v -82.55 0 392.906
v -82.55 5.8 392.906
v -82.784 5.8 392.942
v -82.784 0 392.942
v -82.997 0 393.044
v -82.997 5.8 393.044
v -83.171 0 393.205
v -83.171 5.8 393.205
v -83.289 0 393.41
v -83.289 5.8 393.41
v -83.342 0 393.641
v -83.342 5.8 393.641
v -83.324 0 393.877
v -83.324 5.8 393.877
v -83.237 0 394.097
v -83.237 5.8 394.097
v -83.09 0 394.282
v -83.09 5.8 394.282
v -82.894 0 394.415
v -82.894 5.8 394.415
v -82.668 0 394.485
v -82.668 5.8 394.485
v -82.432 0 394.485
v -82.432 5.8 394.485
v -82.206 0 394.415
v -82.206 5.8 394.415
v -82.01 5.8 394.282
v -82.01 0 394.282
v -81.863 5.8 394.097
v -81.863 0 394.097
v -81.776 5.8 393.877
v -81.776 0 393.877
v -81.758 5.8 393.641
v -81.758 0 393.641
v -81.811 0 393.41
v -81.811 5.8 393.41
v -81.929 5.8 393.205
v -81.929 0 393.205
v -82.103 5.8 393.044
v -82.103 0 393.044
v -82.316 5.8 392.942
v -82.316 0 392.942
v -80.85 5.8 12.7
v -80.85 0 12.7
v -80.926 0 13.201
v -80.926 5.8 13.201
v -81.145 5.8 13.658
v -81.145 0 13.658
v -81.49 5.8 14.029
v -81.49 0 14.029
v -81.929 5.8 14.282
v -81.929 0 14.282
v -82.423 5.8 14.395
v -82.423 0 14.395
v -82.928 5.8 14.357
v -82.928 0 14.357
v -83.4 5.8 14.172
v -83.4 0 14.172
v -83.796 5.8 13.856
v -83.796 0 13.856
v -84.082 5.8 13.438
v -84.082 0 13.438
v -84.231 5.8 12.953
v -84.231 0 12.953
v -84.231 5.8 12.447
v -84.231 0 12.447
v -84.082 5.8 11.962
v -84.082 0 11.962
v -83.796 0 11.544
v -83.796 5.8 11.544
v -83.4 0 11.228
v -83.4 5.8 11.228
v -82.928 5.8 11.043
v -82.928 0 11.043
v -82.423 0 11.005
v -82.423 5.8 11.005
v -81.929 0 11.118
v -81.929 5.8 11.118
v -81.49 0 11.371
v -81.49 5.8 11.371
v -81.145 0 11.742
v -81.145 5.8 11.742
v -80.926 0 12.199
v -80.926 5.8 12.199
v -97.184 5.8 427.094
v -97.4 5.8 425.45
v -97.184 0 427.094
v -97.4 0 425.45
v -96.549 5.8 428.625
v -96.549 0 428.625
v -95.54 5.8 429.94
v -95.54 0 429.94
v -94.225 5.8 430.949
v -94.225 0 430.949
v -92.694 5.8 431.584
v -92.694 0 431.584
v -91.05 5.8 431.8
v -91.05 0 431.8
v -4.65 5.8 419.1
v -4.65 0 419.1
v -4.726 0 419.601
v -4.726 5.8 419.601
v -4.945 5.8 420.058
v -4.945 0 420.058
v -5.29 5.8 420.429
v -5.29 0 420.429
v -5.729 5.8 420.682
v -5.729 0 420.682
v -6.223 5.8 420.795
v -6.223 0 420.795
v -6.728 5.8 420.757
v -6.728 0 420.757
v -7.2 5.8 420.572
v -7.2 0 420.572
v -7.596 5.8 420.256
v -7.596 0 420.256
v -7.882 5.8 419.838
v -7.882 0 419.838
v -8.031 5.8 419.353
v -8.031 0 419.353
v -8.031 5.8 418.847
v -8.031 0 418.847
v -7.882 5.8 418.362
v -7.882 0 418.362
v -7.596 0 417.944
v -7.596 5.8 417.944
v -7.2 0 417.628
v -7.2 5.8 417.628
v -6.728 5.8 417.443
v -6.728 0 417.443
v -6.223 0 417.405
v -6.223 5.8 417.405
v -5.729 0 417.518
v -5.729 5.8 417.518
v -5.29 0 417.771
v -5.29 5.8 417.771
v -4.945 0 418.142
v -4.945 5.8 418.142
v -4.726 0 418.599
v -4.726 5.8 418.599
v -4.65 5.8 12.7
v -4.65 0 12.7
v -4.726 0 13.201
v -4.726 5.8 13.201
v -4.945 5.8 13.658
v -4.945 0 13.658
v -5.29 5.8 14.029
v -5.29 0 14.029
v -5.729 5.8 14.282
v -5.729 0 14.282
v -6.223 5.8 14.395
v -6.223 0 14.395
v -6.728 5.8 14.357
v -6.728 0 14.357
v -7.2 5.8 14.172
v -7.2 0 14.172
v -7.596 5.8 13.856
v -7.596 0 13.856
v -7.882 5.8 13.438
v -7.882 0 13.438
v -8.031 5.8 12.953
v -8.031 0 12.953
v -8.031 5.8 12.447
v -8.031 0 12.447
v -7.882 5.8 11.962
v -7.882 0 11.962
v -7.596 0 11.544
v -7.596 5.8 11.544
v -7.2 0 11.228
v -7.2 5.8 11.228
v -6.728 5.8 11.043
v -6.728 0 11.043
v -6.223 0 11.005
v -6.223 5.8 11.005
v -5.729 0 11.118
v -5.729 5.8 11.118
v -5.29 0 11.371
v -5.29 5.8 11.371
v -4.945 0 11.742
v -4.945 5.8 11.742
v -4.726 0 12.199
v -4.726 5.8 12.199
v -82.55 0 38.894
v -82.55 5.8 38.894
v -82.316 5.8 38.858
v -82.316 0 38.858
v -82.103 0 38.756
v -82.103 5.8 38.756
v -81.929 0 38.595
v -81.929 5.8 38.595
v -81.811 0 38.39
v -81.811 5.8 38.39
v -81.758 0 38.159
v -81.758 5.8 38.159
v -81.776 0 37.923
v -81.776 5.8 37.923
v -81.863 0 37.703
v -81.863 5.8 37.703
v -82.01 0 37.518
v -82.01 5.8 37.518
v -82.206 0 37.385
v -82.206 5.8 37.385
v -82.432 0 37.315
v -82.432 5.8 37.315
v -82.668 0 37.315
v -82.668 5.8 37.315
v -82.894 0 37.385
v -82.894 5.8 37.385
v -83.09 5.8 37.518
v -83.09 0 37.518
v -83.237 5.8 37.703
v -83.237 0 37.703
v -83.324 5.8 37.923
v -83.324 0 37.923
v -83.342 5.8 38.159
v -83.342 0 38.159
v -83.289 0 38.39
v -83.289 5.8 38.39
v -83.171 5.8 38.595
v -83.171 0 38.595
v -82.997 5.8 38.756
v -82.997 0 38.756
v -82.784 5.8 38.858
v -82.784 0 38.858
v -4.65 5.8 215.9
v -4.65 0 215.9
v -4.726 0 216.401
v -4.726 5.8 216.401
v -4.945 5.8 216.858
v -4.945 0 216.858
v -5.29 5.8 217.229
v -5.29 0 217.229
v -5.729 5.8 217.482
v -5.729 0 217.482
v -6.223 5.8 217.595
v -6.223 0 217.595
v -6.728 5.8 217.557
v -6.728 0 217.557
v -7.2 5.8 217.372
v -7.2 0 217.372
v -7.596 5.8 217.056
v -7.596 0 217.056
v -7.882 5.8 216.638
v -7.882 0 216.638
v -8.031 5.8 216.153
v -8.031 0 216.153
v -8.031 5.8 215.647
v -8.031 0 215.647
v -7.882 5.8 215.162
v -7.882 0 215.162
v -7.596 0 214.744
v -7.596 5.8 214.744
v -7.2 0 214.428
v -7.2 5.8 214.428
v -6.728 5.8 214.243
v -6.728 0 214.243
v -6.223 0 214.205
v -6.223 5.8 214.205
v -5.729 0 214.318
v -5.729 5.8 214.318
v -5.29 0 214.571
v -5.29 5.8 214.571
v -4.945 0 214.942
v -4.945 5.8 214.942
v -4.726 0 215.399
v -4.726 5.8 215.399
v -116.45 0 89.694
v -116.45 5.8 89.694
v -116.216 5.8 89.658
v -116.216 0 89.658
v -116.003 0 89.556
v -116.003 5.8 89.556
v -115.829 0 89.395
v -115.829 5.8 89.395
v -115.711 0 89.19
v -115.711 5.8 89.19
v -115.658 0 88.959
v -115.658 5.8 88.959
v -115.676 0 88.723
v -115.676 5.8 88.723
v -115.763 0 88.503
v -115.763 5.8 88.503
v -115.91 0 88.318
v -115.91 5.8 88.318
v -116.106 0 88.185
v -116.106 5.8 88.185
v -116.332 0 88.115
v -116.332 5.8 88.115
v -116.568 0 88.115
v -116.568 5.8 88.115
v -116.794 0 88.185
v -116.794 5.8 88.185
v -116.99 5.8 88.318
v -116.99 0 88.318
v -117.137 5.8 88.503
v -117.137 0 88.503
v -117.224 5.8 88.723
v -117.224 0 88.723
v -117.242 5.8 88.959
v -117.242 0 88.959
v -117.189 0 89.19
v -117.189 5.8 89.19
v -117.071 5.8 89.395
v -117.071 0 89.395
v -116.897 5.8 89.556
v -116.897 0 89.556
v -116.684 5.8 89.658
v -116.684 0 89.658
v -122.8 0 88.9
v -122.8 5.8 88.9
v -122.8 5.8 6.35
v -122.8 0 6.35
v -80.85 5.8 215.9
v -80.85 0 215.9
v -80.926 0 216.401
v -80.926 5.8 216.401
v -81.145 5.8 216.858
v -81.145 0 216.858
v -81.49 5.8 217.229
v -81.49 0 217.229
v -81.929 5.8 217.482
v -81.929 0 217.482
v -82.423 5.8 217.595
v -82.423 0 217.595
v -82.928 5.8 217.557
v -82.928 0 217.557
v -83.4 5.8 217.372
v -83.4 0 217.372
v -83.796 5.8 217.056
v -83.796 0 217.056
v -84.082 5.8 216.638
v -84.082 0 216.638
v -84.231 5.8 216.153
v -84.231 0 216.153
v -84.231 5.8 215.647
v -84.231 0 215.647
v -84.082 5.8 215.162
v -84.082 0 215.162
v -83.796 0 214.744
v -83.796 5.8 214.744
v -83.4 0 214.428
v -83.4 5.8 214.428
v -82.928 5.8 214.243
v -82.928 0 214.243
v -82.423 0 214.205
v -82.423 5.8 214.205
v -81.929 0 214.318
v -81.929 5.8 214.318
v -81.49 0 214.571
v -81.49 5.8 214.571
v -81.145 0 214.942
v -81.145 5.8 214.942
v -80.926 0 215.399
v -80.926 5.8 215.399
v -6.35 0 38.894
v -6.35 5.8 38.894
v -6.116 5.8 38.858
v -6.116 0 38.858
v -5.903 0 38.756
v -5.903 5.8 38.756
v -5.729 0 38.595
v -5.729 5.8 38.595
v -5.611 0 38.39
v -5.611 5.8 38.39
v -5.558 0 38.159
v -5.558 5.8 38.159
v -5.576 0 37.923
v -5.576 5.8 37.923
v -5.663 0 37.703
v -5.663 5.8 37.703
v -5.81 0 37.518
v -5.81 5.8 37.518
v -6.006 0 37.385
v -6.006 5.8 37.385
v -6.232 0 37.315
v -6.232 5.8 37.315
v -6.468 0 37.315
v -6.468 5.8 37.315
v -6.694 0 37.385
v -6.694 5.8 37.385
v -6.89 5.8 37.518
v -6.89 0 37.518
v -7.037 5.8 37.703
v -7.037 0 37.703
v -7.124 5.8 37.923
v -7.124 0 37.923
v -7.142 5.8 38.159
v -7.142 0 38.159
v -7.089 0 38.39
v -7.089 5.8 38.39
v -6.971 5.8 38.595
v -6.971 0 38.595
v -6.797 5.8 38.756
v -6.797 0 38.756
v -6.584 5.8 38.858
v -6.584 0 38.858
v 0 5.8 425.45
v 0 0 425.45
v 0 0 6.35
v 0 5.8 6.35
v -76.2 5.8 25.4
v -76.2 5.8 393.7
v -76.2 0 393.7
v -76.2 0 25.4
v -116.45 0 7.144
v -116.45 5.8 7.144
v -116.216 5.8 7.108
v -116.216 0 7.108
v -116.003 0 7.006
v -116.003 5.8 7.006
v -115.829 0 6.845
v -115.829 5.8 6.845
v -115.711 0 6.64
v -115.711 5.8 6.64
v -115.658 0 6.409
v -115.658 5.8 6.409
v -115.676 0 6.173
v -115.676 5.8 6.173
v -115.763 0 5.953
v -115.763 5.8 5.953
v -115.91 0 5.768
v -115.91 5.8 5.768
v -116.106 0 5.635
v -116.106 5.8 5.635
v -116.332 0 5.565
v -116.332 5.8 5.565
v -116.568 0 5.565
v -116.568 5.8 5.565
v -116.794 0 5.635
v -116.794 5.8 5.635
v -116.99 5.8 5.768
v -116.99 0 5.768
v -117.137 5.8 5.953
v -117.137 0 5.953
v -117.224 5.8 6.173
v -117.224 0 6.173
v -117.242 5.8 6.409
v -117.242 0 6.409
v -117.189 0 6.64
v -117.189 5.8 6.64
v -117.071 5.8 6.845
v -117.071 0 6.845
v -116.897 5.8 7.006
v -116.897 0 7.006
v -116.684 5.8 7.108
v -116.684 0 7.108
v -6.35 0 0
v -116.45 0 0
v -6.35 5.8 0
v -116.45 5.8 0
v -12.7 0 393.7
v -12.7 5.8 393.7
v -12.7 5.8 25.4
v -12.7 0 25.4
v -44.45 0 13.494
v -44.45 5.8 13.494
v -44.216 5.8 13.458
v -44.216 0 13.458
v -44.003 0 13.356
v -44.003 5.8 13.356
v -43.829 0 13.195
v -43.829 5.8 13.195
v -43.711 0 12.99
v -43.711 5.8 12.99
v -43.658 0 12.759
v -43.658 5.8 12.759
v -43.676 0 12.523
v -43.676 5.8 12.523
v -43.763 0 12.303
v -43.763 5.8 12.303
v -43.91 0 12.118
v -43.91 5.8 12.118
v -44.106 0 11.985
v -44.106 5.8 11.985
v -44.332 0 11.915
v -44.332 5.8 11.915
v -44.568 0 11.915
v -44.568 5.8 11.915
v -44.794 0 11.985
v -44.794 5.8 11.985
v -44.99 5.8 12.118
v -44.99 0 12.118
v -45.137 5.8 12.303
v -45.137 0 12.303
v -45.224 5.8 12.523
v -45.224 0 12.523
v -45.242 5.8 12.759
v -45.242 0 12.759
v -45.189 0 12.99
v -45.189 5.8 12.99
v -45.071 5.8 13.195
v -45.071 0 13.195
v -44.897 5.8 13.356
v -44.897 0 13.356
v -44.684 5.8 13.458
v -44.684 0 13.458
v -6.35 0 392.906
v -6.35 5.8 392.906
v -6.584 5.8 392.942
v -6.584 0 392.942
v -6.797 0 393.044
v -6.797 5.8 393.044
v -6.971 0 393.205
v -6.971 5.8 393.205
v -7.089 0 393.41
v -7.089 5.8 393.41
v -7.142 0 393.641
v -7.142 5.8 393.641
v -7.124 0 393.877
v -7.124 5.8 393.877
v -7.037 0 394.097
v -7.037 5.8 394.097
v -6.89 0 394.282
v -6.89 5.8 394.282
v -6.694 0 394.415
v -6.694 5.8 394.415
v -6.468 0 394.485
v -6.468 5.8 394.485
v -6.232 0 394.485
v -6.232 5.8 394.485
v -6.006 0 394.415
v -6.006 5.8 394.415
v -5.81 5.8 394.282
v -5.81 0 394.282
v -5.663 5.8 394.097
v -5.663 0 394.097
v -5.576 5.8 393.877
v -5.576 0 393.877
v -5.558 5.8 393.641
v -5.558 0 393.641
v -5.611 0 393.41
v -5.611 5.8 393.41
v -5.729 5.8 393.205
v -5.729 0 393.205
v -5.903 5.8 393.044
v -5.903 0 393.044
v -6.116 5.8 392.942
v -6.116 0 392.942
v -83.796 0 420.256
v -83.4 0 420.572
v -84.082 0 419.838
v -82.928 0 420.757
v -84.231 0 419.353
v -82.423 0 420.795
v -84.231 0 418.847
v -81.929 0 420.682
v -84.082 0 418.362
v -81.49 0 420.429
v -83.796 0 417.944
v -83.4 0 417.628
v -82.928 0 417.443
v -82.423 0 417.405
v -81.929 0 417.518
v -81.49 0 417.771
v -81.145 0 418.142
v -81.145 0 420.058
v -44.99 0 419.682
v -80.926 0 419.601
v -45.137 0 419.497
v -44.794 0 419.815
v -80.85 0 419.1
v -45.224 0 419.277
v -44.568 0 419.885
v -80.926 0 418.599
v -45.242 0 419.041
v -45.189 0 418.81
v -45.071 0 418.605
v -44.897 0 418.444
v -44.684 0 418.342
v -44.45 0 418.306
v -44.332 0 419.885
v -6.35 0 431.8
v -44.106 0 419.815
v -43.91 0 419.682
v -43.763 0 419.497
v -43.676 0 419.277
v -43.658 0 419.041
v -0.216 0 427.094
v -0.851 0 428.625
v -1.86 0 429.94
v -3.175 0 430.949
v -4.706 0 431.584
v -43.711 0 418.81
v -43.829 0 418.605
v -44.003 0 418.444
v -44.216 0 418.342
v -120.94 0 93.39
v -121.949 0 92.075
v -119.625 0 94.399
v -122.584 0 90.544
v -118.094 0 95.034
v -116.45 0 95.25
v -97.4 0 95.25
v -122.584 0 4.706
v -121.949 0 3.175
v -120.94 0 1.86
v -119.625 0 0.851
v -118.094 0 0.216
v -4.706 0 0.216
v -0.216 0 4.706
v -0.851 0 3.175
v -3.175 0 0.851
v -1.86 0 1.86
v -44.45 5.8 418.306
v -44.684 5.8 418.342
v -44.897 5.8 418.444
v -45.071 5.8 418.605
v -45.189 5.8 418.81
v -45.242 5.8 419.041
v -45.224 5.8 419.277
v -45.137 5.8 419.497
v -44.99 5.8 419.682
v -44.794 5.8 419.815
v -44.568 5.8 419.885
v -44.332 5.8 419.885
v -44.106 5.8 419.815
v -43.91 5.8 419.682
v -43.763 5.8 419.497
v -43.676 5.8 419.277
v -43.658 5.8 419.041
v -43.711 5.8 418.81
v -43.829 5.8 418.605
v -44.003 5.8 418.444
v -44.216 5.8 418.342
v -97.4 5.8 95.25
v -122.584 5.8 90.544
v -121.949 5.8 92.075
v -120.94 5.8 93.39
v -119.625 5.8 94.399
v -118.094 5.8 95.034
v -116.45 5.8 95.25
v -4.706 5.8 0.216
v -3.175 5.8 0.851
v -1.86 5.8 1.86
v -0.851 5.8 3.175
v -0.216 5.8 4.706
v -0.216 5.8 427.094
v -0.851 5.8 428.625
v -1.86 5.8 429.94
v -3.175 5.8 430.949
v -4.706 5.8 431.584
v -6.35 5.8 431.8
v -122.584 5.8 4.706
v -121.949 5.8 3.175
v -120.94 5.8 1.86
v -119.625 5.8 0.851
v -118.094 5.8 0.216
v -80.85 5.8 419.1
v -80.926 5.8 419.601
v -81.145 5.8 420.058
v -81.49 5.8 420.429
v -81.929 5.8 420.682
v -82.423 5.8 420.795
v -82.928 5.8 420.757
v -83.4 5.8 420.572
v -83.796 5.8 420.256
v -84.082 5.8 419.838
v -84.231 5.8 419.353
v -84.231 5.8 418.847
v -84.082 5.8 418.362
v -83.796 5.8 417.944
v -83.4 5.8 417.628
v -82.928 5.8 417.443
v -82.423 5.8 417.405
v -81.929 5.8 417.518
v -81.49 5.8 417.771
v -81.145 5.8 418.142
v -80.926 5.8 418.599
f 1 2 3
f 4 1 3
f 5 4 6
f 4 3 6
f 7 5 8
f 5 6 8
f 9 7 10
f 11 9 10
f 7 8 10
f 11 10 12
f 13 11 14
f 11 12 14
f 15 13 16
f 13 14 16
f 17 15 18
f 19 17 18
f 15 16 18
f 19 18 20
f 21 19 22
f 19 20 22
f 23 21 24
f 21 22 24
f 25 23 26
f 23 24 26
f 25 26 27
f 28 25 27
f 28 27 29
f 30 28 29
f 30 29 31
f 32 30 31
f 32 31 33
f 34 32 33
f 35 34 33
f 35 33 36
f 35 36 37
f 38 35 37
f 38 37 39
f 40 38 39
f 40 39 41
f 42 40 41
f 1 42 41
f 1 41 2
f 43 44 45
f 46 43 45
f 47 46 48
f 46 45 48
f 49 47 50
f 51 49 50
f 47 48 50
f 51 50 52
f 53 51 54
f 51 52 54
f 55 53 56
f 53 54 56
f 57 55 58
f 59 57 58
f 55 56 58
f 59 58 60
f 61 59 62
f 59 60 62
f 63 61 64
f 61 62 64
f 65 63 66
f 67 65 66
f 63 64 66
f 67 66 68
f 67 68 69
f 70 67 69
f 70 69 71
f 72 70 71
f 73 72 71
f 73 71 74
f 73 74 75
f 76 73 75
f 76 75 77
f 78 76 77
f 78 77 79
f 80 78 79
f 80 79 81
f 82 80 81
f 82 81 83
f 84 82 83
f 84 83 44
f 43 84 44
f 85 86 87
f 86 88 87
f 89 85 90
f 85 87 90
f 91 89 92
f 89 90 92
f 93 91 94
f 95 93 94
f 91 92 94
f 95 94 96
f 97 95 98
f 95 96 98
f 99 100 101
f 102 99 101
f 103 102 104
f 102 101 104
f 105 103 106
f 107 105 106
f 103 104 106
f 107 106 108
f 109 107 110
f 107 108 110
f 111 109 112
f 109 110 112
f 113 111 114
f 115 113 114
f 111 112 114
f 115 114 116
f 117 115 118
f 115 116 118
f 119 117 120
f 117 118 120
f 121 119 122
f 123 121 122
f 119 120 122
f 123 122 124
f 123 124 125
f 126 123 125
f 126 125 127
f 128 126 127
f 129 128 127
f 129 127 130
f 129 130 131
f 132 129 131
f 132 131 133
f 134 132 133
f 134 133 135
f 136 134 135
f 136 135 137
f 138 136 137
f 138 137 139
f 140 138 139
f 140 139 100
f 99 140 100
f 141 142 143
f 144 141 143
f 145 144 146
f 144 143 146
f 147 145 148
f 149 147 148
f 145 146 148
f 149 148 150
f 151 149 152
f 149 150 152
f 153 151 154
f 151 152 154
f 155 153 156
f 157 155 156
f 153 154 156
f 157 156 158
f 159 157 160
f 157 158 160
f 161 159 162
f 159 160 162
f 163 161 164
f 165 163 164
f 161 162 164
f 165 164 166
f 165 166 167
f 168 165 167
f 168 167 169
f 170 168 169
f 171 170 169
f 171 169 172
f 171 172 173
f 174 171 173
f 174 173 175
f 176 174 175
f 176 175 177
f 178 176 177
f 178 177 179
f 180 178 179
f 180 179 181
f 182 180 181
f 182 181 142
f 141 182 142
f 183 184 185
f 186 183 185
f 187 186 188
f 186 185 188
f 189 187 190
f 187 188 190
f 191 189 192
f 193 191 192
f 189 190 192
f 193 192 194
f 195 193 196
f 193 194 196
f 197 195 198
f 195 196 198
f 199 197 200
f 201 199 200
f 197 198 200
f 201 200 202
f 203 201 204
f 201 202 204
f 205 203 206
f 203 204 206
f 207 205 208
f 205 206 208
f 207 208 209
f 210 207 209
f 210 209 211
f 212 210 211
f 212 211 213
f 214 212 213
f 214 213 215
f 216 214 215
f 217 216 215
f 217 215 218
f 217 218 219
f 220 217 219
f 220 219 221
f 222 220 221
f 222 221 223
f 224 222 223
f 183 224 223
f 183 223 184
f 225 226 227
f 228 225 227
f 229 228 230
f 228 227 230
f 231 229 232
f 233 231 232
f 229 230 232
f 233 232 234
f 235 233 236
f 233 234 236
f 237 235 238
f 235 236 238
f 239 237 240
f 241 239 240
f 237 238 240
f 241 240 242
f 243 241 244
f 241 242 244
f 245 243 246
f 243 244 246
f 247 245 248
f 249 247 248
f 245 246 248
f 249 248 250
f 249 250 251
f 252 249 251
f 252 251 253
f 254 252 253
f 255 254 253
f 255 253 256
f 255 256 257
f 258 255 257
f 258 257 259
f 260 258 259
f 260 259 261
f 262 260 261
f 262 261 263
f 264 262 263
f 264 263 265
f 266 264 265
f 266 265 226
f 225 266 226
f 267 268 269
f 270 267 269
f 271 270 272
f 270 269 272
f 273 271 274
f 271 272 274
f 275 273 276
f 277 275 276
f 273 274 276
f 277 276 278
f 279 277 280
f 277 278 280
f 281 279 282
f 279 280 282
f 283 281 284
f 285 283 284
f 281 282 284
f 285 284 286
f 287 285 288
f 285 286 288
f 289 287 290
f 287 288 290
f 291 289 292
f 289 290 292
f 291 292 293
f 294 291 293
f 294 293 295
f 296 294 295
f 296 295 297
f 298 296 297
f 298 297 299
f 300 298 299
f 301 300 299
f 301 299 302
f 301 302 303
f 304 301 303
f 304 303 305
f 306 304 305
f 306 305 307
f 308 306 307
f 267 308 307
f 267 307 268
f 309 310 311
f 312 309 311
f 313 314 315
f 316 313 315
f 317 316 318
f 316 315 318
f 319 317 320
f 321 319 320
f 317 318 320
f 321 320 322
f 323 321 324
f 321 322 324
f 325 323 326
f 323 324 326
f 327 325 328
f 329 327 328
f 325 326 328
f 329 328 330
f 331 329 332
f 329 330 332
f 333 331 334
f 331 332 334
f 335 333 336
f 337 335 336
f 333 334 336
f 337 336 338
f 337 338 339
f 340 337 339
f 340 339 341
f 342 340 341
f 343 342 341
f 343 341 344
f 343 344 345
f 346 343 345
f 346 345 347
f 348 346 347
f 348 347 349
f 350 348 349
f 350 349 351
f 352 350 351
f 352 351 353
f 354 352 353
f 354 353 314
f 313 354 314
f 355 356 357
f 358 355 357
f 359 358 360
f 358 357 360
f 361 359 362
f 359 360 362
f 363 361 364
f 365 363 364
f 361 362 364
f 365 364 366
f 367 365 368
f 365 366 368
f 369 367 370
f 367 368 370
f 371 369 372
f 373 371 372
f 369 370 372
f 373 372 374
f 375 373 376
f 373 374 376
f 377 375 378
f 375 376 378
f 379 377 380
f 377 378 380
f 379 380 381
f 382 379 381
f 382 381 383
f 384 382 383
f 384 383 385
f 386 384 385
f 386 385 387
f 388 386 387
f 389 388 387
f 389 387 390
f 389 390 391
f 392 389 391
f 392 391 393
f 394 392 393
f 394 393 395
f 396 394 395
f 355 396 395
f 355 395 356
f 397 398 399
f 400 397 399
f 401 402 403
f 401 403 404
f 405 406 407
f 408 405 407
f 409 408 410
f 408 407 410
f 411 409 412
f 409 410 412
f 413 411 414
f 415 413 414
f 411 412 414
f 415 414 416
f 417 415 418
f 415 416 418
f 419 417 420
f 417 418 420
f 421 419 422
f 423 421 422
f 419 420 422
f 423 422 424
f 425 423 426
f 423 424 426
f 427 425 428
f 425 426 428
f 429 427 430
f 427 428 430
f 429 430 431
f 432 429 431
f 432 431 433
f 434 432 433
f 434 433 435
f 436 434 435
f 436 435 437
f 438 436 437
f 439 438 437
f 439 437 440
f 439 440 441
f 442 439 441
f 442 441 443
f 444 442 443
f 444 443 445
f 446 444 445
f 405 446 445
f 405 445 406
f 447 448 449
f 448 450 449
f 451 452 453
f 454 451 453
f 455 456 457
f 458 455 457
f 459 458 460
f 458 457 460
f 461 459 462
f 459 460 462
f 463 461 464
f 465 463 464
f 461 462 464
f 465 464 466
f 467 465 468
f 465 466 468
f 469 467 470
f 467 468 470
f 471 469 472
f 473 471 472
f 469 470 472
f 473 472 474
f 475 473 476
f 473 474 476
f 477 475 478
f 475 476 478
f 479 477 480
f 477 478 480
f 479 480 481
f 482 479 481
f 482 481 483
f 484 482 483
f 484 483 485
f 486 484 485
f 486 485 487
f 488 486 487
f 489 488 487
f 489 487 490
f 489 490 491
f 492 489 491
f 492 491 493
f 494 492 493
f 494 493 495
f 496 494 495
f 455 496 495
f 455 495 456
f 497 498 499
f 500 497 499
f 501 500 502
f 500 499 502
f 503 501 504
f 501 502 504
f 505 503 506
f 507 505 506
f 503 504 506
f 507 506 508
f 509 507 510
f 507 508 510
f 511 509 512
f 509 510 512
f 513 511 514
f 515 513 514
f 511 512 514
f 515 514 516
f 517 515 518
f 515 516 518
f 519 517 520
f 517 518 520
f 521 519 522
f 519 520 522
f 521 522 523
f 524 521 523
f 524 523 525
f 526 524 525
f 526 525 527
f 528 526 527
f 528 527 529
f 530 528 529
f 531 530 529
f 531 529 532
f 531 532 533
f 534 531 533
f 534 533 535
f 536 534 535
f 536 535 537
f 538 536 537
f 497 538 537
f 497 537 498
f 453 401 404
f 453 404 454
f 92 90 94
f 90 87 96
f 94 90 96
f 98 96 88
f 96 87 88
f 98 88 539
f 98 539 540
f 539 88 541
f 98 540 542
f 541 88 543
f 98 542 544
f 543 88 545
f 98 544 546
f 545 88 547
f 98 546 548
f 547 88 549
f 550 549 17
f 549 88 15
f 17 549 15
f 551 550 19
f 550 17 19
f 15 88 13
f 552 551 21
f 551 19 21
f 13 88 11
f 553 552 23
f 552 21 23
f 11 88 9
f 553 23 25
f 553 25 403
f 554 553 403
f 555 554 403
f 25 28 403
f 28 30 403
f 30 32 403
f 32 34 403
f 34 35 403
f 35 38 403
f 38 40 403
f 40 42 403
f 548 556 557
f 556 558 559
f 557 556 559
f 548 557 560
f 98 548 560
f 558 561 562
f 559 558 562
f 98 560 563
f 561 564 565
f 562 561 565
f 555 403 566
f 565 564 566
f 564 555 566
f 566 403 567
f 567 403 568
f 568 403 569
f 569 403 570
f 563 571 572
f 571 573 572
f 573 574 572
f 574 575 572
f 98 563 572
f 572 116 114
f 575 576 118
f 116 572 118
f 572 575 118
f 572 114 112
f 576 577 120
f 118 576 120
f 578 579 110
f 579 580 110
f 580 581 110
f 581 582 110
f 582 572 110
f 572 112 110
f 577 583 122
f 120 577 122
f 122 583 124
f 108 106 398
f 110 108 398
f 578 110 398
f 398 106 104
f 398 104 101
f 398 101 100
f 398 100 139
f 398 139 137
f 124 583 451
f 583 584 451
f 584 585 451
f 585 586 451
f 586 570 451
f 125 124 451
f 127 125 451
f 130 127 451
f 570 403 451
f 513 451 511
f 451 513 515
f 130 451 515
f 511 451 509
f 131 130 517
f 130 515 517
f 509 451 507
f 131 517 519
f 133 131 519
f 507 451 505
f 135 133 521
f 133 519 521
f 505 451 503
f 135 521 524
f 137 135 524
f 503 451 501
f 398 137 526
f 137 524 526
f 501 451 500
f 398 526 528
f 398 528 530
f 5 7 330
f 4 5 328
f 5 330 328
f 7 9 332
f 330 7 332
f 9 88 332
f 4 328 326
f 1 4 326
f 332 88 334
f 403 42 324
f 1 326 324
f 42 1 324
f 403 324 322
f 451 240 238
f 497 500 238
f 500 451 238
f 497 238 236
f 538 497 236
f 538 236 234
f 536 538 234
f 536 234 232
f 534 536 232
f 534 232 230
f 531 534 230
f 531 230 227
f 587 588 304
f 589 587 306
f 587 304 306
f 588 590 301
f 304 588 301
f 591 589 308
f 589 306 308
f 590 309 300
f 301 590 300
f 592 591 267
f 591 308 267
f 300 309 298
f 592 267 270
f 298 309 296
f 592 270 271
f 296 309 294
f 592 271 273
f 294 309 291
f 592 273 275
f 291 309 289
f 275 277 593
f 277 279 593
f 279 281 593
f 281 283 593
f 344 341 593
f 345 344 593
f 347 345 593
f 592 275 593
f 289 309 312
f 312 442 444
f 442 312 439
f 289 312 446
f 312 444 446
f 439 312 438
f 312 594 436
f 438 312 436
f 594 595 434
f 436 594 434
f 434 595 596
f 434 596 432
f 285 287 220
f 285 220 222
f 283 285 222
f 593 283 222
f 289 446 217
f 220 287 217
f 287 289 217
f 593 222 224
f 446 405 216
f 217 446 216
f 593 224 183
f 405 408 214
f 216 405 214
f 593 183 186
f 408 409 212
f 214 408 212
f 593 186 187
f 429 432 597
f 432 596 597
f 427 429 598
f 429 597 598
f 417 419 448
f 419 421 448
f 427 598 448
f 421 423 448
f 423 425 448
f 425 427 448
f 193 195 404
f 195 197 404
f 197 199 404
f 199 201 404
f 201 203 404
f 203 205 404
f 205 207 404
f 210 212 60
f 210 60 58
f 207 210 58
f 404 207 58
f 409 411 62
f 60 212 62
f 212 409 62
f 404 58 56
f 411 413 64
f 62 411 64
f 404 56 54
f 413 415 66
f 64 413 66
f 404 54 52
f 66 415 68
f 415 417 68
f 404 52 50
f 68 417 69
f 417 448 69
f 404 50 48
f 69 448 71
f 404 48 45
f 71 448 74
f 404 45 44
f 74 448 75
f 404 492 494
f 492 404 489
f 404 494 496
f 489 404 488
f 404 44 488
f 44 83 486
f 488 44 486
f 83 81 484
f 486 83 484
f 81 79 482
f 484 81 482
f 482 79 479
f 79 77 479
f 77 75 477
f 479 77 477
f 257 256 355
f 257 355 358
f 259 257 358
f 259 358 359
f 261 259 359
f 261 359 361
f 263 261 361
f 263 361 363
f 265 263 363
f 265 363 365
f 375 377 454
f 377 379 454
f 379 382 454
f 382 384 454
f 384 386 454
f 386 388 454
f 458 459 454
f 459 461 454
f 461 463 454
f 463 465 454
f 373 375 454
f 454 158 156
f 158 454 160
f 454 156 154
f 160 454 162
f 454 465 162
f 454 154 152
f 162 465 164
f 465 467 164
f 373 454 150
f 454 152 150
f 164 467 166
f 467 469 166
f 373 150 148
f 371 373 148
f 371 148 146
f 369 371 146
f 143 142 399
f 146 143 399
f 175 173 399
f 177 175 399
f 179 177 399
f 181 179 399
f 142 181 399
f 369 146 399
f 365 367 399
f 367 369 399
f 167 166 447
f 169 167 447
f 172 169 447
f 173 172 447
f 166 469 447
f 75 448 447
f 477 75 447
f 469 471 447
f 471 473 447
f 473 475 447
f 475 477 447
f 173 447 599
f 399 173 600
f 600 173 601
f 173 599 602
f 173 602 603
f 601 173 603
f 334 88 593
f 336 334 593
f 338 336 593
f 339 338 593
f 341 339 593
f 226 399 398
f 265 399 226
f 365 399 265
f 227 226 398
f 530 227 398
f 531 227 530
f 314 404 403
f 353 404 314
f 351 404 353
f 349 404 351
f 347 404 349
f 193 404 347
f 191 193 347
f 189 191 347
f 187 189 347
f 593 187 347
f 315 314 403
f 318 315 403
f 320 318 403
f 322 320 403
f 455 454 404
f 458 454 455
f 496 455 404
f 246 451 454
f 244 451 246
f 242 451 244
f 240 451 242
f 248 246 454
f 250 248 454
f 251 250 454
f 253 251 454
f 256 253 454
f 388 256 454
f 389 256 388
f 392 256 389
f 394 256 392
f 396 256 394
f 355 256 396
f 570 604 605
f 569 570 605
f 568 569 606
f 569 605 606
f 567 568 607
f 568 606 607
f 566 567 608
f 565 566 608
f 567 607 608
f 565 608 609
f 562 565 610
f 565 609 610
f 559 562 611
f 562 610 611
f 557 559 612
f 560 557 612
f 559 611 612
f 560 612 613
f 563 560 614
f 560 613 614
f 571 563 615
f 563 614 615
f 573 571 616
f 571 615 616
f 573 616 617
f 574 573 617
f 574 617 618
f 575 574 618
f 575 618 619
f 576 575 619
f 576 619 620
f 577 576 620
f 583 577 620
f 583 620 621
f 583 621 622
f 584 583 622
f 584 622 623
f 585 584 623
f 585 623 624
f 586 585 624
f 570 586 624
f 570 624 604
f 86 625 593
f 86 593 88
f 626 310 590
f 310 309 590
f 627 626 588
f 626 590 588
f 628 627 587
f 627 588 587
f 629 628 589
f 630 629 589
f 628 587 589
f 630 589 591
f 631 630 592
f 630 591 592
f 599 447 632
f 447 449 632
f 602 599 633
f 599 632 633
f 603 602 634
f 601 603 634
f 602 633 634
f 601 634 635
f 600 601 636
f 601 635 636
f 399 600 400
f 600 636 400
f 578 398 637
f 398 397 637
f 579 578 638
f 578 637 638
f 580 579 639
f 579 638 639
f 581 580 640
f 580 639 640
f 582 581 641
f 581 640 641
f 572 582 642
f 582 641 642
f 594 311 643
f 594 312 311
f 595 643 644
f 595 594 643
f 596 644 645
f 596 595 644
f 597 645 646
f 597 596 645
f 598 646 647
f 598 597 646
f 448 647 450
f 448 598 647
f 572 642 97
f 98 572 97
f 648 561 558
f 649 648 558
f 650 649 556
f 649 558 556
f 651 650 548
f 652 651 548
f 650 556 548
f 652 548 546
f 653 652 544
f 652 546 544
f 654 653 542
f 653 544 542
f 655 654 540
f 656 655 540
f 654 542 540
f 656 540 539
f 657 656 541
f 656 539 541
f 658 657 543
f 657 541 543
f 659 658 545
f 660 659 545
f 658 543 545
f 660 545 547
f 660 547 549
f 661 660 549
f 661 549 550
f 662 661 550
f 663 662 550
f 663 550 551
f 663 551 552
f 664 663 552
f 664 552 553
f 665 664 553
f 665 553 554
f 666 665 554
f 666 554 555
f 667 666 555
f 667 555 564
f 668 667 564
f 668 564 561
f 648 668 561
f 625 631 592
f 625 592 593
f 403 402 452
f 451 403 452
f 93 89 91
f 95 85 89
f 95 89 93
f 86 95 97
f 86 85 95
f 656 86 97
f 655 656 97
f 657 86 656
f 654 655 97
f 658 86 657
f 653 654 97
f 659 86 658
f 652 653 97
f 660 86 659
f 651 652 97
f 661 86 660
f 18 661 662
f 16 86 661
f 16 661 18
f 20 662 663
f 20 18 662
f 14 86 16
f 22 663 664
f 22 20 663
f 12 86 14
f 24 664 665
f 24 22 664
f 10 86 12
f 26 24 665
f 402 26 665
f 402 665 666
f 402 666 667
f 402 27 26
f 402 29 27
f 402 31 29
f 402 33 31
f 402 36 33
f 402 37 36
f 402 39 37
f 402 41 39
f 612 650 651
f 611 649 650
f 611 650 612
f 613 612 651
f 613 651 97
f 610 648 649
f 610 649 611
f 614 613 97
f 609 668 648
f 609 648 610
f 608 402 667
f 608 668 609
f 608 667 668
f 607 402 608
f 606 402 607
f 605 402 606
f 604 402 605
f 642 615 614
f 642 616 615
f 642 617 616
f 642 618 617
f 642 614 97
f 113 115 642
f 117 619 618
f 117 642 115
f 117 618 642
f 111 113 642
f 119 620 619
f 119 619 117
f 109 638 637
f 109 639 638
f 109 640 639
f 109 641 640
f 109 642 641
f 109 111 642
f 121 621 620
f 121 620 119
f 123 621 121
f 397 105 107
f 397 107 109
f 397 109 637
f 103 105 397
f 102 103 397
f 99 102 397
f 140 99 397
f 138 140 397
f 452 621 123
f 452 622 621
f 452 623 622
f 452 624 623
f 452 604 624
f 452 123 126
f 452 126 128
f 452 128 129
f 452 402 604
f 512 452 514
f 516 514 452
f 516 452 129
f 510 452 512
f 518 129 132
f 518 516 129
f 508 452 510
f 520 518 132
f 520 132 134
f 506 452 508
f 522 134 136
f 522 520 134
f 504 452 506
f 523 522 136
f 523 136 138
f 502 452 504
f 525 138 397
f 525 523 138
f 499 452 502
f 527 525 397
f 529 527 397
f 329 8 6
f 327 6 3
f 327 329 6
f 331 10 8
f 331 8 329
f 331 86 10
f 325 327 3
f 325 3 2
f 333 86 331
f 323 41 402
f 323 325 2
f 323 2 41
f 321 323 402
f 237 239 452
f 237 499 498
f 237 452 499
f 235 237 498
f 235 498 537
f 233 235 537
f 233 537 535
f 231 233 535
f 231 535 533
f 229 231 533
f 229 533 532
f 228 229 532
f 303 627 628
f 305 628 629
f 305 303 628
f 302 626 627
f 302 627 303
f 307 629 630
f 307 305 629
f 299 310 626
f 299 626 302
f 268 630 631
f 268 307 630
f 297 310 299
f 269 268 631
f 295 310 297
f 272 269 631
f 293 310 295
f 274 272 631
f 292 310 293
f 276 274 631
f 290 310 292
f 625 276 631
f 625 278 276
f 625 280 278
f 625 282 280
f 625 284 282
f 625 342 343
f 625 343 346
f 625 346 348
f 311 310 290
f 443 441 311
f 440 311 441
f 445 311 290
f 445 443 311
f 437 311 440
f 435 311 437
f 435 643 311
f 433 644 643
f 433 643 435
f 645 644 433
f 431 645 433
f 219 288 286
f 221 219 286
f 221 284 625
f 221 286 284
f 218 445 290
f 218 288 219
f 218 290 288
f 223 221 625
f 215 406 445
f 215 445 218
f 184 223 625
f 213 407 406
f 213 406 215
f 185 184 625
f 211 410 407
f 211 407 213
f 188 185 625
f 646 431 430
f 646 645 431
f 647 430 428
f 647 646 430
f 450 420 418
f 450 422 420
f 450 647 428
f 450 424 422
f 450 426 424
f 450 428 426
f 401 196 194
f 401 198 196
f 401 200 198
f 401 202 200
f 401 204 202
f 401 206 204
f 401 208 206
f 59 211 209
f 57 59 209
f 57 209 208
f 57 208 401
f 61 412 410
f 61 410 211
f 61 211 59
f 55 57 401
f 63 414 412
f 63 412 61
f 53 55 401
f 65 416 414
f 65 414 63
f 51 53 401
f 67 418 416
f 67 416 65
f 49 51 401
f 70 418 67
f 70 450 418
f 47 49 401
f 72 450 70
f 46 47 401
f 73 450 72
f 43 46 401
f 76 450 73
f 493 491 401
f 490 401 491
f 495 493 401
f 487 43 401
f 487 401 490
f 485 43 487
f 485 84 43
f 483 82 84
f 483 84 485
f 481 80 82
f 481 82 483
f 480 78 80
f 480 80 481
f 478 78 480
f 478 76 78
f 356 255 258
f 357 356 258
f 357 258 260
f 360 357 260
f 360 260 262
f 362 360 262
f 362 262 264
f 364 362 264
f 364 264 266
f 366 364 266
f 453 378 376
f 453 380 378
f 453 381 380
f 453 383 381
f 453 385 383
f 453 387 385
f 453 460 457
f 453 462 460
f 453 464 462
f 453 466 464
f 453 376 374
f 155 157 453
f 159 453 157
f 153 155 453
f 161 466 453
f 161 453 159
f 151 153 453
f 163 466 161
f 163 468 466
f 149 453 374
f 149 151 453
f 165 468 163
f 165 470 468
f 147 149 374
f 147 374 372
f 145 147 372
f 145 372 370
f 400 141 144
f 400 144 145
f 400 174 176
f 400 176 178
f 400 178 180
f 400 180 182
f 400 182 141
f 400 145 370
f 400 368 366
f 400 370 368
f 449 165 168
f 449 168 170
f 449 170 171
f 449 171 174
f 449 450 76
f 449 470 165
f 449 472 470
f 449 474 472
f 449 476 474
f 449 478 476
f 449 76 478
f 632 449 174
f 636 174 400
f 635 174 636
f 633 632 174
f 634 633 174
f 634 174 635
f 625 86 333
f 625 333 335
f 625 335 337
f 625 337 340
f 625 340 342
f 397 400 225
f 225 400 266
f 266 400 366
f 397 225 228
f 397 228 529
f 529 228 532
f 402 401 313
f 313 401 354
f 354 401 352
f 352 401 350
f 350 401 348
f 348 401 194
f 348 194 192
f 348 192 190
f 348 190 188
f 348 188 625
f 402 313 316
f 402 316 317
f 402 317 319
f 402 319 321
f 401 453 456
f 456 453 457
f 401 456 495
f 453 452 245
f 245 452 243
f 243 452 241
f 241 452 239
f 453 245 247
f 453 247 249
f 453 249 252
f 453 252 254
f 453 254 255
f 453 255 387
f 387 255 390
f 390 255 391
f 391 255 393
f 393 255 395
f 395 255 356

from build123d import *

# Parameters (mm, degrees)
SKETCH1_W            = 88.9
SKETCH1_H            = 431.8
BOSS_EXTRUDE1_DEPTH  = 5.8
M3_CLEARANCE_HOLE1_D = 3.4
SKETCH2_W            = 63.5
SKETCH2_H            = 368.3
CUT_EXTRUDE1_DEPTH   = 441.89464728
SKETCH3_W            = 8.5
SKETCH3_H            = 431.8
BOSS_EXTRUDE2_DEPTH  = 5.8
SKETCH7_R            = 0.79375
CUT_EXTRUDE2_DEPTH   = 443.68684191
SKETCH9_W            = 25.4
SKETCH9_H            = 95.25
BOSS_EXTRUDE3_DEPTH  = 5.8
SKETCH10_R           = 0.79375
CUT_EXTRUDE4_DEPTH   = 449.959597291
FILLET1_R            = 6.35


with BuildPart() as part:
    # Sketch1 → Boss-Extrude1 (new body)
    with BuildSketch(Plane(origin=(0, 0, 0), x_dir=(1, 0, 0), z_dir=(0, 1, 0))):
        with Locations((-44.45, -215.9)):
            Rectangle(SKETCH1_W, SKETCH1_H)
    extrude(amount=BOSS_EXTRUDE1_DEPTH)

    # M3 Clearance Hole1 (through all)
    with Locations(Plane(origin=(0, 5.8, 0), x_dir=(-1, 0, 0), z_dir=(0, 1, 0))):
        with Locations((82.55, 12.7), (6.35, 12.7), (6.35, 419.1), (82.55, 419.1), (82.55, 215.9), (6.35, 215.9)):
            Hole(M3_CLEARANCE_HOLE1_D / 2)

    # Sketch2 → Cut-Extrude1 (cut, through all)
    with BuildSketch(Plane(origin=(0, 5.8, 0), x_dir=(1, 0, 0), z_dir=(0, 1, 0))):
        with Locations((-44.45, -209.55)):
            Rectangle(SKETCH2_W, SKETCH2_H)
    extrude(amount=-CUT_EXTRUDE1_DEPTH, mode=Mode.SUBTRACT)

    # Sketch3 → Boss-Extrude2 (add, through all)
    with BuildSketch(Plane(origin=(0, 5.8, 0), x_dir=(-1, 0, 0), z_dir=(0, 1, 0))):
        with Locations((93.15, 215.9)):
            Rectangle(SKETCH3_W, SKETCH3_H)
    extrude(amount=-BOSS_EXTRUDE2_DEPTH)

    # Sketch7 → Cut-Extrude2 (cut, through all)
    with BuildSketch(Plane(origin=(0, 5.8, 0), x_dir=(1, 0, 0), z_dir=(0, 1, 0))):
        with Locations(Location((-44.45, -12.7, 0), (0, 0, 270))):
            Circle(SKETCH7_R)
        with Locations(Location((-82.55, -38.1, 0), (0, 0, 270))):
            Circle(SKETCH7_R)
        with Locations(Location((-6.35, -38.1, 0), (0, 0, 270))):
            Circle(SKETCH7_R)
        with Locations(Location((-6.35, -393.7, 0), (0, 0, 90))):
            Circle(SKETCH7_R)
        with Locations(Location((-82.55, -393.7, 0), (0, 0, 90))):
            Circle(SKETCH7_R)
        with Locations(Location((-44.45, -419.1, 0), (0, 0, 90))):
            Circle(SKETCH7_R)
    extrude(amount=-CUT_EXTRUDE2_DEPTH, mode=Mode.SUBTRACT)

    # Sketch9 → Boss-Extrude3 (add, through all)
    with BuildSketch(Plane(origin=(0, 5.8, 0), x_dir=(1, 0, 0), z_dir=(0, 1, 0))):
        with Locations((-110.1, -47.625)):
            Rectangle(SKETCH9_W, SKETCH9_H)
    extrude(amount=-BOSS_EXTRUDE3_DEPTH)

    # Sketch10 → Cut-Extrude4 (cut, through all)
    with BuildSketch(Plane(origin=(0, 5.8, 0), x_dir=(1, 0, 0), z_dir=(0, 1, 0))):
        with Locations(Location((-116.45, -88.9, 0), (0, 0, 270))):
            Circle(SKETCH10_R)
        with Locations(Location((-116.45, -6.35, 0), (0, 0, 270))):
            Circle(SKETCH10_R)
    extrude(amount=-CUT_EXTRUDE4_DEPTH, mode=Mode.SUBTRACT)

    # Fillet1
    fillet1_edges = [part.edges().sort_by_distance(p)[0] for p in [
        (0, 2.9, 431.8),
        (-97.4, 2.9, 431.8),
        (-122.8, 2.9, 95.25),
        (0, 2.9, 0),
        (-122.8, 2.9, 0),
    ]]
    fillet(fillet1_edges, radius=FILLET1_R)


solid = part.part
